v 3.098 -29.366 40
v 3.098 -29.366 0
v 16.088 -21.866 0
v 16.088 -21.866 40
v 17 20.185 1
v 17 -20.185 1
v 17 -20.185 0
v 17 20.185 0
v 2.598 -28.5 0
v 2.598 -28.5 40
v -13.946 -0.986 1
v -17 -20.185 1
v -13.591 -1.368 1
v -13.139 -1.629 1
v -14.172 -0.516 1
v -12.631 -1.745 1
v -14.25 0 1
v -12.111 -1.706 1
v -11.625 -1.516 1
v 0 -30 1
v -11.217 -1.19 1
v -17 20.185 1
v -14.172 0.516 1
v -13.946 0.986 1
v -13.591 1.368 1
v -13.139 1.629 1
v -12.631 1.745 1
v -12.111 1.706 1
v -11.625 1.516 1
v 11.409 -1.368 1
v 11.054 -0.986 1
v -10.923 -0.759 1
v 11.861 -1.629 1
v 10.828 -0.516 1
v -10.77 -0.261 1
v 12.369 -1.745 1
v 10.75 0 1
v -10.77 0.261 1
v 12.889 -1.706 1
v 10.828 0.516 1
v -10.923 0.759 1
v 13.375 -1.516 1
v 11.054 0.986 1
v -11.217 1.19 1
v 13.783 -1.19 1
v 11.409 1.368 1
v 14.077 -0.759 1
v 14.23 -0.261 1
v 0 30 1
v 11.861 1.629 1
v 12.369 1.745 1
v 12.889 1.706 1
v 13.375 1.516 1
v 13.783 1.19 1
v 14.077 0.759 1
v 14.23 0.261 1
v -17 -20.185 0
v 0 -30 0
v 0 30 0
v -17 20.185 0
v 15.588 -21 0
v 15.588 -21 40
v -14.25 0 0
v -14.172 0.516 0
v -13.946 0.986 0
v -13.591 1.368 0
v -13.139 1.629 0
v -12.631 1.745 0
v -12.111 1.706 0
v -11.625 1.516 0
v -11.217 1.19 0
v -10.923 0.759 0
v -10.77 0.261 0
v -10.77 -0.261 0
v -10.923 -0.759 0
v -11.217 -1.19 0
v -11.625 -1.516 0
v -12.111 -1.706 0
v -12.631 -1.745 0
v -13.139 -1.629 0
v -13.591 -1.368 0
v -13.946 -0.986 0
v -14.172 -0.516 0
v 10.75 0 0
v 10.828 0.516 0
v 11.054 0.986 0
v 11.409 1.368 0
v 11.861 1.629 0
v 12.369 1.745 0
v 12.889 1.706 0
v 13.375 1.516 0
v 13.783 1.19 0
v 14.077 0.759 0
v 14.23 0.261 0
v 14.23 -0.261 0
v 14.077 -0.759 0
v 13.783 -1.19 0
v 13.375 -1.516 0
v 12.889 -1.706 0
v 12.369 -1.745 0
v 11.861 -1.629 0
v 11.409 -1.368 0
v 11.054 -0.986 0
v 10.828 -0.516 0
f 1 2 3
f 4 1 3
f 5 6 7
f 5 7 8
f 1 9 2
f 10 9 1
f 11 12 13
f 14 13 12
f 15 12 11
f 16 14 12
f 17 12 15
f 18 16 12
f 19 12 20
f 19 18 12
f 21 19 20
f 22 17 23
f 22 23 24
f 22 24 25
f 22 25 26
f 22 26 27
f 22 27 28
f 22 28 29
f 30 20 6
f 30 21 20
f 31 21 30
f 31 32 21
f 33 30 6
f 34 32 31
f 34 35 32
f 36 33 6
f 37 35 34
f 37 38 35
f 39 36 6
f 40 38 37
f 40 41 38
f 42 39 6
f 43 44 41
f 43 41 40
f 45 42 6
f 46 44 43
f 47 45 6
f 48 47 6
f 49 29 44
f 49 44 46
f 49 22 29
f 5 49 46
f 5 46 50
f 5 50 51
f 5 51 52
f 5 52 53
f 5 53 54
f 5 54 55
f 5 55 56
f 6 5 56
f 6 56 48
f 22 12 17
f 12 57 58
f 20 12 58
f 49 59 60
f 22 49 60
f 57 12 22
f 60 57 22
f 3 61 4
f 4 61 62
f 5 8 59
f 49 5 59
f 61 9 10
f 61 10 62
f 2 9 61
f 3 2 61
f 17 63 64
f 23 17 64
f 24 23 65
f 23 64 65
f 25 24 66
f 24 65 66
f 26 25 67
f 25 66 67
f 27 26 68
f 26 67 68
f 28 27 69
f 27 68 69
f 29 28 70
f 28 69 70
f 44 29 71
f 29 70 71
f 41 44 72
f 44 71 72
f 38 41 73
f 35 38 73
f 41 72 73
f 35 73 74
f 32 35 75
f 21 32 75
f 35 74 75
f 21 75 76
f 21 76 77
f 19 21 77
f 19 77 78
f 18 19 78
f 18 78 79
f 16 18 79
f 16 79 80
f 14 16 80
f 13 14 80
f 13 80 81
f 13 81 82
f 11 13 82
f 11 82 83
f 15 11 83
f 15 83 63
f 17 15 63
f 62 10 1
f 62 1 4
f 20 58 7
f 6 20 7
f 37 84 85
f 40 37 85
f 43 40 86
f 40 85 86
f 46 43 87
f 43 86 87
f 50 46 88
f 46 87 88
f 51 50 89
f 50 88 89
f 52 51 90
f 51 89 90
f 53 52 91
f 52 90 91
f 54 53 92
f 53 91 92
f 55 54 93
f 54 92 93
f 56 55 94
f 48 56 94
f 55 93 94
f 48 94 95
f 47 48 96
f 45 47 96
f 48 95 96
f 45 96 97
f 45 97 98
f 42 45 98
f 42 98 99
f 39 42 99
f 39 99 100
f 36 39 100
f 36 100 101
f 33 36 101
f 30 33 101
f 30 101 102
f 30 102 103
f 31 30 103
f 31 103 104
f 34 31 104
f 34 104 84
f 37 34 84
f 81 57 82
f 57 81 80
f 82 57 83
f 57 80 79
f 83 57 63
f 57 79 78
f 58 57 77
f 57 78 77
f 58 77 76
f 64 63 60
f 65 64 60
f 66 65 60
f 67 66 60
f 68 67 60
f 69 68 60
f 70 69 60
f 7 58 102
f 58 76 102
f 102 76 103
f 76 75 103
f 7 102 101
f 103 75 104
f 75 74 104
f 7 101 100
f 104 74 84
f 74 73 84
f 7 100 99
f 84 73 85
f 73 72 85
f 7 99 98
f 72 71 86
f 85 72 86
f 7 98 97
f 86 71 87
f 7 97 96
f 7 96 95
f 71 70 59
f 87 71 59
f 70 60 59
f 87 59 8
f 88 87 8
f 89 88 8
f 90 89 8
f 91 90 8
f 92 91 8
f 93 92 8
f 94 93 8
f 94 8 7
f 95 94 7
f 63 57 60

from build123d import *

# Parameters (mm, degrees)
F1_DEPTH = 1
F2_W     = 15
F2_H     = 40
F3_DEPTH = 1
F4_W     = 15
F4_H     = 50
F5_DEPTH = 25
F7_D     = 3.5


with BuildPart() as f1:
    # F0 (on Top) → F1 (new body)
    with BuildSketch(Plane.XY):
        Polygon((25.980762, -15), (25.980762, 15), (0, 30), (-25.980762, 15), (-25.980762, -15), (0, -30), align=None)
    extrude(amount=F1_DEPTH)

    # F4 (on face) → F5 (cut)
    with BuildSketch(Plane.XY.offset(1)):
        with Locations((-24.5, 0)):
            Rectangle(F4_W, F4_H)
        with Locations((24.5, 0)):
            Rectangle(F4_W, F4_H)
    extrude(amount=-F5_DEPTH, mode=Mode.SUBTRACT)

    # F7 (through all)
    with Locations(Plane.XY.offset(1)):
        with Locations((12.5, 0), (-12.5, 0)):
            Hole(F7_D / 2)


with BuildPart() as f3:
    # F2 (on face) → F3 (new body)
    with BuildSketch(Plane(origin=(12.990381, -22.5, 0), x_dir=(0.866025, 0.5, 0), z_dir=(0.5, -0.866025, 0))):
        with Locations((-4.5, 20)):
            Rectangle(F2_W, F2_H)
    extrude(amount=F3_DEPTH)


solid = Compound([f1.part, f3.part])
